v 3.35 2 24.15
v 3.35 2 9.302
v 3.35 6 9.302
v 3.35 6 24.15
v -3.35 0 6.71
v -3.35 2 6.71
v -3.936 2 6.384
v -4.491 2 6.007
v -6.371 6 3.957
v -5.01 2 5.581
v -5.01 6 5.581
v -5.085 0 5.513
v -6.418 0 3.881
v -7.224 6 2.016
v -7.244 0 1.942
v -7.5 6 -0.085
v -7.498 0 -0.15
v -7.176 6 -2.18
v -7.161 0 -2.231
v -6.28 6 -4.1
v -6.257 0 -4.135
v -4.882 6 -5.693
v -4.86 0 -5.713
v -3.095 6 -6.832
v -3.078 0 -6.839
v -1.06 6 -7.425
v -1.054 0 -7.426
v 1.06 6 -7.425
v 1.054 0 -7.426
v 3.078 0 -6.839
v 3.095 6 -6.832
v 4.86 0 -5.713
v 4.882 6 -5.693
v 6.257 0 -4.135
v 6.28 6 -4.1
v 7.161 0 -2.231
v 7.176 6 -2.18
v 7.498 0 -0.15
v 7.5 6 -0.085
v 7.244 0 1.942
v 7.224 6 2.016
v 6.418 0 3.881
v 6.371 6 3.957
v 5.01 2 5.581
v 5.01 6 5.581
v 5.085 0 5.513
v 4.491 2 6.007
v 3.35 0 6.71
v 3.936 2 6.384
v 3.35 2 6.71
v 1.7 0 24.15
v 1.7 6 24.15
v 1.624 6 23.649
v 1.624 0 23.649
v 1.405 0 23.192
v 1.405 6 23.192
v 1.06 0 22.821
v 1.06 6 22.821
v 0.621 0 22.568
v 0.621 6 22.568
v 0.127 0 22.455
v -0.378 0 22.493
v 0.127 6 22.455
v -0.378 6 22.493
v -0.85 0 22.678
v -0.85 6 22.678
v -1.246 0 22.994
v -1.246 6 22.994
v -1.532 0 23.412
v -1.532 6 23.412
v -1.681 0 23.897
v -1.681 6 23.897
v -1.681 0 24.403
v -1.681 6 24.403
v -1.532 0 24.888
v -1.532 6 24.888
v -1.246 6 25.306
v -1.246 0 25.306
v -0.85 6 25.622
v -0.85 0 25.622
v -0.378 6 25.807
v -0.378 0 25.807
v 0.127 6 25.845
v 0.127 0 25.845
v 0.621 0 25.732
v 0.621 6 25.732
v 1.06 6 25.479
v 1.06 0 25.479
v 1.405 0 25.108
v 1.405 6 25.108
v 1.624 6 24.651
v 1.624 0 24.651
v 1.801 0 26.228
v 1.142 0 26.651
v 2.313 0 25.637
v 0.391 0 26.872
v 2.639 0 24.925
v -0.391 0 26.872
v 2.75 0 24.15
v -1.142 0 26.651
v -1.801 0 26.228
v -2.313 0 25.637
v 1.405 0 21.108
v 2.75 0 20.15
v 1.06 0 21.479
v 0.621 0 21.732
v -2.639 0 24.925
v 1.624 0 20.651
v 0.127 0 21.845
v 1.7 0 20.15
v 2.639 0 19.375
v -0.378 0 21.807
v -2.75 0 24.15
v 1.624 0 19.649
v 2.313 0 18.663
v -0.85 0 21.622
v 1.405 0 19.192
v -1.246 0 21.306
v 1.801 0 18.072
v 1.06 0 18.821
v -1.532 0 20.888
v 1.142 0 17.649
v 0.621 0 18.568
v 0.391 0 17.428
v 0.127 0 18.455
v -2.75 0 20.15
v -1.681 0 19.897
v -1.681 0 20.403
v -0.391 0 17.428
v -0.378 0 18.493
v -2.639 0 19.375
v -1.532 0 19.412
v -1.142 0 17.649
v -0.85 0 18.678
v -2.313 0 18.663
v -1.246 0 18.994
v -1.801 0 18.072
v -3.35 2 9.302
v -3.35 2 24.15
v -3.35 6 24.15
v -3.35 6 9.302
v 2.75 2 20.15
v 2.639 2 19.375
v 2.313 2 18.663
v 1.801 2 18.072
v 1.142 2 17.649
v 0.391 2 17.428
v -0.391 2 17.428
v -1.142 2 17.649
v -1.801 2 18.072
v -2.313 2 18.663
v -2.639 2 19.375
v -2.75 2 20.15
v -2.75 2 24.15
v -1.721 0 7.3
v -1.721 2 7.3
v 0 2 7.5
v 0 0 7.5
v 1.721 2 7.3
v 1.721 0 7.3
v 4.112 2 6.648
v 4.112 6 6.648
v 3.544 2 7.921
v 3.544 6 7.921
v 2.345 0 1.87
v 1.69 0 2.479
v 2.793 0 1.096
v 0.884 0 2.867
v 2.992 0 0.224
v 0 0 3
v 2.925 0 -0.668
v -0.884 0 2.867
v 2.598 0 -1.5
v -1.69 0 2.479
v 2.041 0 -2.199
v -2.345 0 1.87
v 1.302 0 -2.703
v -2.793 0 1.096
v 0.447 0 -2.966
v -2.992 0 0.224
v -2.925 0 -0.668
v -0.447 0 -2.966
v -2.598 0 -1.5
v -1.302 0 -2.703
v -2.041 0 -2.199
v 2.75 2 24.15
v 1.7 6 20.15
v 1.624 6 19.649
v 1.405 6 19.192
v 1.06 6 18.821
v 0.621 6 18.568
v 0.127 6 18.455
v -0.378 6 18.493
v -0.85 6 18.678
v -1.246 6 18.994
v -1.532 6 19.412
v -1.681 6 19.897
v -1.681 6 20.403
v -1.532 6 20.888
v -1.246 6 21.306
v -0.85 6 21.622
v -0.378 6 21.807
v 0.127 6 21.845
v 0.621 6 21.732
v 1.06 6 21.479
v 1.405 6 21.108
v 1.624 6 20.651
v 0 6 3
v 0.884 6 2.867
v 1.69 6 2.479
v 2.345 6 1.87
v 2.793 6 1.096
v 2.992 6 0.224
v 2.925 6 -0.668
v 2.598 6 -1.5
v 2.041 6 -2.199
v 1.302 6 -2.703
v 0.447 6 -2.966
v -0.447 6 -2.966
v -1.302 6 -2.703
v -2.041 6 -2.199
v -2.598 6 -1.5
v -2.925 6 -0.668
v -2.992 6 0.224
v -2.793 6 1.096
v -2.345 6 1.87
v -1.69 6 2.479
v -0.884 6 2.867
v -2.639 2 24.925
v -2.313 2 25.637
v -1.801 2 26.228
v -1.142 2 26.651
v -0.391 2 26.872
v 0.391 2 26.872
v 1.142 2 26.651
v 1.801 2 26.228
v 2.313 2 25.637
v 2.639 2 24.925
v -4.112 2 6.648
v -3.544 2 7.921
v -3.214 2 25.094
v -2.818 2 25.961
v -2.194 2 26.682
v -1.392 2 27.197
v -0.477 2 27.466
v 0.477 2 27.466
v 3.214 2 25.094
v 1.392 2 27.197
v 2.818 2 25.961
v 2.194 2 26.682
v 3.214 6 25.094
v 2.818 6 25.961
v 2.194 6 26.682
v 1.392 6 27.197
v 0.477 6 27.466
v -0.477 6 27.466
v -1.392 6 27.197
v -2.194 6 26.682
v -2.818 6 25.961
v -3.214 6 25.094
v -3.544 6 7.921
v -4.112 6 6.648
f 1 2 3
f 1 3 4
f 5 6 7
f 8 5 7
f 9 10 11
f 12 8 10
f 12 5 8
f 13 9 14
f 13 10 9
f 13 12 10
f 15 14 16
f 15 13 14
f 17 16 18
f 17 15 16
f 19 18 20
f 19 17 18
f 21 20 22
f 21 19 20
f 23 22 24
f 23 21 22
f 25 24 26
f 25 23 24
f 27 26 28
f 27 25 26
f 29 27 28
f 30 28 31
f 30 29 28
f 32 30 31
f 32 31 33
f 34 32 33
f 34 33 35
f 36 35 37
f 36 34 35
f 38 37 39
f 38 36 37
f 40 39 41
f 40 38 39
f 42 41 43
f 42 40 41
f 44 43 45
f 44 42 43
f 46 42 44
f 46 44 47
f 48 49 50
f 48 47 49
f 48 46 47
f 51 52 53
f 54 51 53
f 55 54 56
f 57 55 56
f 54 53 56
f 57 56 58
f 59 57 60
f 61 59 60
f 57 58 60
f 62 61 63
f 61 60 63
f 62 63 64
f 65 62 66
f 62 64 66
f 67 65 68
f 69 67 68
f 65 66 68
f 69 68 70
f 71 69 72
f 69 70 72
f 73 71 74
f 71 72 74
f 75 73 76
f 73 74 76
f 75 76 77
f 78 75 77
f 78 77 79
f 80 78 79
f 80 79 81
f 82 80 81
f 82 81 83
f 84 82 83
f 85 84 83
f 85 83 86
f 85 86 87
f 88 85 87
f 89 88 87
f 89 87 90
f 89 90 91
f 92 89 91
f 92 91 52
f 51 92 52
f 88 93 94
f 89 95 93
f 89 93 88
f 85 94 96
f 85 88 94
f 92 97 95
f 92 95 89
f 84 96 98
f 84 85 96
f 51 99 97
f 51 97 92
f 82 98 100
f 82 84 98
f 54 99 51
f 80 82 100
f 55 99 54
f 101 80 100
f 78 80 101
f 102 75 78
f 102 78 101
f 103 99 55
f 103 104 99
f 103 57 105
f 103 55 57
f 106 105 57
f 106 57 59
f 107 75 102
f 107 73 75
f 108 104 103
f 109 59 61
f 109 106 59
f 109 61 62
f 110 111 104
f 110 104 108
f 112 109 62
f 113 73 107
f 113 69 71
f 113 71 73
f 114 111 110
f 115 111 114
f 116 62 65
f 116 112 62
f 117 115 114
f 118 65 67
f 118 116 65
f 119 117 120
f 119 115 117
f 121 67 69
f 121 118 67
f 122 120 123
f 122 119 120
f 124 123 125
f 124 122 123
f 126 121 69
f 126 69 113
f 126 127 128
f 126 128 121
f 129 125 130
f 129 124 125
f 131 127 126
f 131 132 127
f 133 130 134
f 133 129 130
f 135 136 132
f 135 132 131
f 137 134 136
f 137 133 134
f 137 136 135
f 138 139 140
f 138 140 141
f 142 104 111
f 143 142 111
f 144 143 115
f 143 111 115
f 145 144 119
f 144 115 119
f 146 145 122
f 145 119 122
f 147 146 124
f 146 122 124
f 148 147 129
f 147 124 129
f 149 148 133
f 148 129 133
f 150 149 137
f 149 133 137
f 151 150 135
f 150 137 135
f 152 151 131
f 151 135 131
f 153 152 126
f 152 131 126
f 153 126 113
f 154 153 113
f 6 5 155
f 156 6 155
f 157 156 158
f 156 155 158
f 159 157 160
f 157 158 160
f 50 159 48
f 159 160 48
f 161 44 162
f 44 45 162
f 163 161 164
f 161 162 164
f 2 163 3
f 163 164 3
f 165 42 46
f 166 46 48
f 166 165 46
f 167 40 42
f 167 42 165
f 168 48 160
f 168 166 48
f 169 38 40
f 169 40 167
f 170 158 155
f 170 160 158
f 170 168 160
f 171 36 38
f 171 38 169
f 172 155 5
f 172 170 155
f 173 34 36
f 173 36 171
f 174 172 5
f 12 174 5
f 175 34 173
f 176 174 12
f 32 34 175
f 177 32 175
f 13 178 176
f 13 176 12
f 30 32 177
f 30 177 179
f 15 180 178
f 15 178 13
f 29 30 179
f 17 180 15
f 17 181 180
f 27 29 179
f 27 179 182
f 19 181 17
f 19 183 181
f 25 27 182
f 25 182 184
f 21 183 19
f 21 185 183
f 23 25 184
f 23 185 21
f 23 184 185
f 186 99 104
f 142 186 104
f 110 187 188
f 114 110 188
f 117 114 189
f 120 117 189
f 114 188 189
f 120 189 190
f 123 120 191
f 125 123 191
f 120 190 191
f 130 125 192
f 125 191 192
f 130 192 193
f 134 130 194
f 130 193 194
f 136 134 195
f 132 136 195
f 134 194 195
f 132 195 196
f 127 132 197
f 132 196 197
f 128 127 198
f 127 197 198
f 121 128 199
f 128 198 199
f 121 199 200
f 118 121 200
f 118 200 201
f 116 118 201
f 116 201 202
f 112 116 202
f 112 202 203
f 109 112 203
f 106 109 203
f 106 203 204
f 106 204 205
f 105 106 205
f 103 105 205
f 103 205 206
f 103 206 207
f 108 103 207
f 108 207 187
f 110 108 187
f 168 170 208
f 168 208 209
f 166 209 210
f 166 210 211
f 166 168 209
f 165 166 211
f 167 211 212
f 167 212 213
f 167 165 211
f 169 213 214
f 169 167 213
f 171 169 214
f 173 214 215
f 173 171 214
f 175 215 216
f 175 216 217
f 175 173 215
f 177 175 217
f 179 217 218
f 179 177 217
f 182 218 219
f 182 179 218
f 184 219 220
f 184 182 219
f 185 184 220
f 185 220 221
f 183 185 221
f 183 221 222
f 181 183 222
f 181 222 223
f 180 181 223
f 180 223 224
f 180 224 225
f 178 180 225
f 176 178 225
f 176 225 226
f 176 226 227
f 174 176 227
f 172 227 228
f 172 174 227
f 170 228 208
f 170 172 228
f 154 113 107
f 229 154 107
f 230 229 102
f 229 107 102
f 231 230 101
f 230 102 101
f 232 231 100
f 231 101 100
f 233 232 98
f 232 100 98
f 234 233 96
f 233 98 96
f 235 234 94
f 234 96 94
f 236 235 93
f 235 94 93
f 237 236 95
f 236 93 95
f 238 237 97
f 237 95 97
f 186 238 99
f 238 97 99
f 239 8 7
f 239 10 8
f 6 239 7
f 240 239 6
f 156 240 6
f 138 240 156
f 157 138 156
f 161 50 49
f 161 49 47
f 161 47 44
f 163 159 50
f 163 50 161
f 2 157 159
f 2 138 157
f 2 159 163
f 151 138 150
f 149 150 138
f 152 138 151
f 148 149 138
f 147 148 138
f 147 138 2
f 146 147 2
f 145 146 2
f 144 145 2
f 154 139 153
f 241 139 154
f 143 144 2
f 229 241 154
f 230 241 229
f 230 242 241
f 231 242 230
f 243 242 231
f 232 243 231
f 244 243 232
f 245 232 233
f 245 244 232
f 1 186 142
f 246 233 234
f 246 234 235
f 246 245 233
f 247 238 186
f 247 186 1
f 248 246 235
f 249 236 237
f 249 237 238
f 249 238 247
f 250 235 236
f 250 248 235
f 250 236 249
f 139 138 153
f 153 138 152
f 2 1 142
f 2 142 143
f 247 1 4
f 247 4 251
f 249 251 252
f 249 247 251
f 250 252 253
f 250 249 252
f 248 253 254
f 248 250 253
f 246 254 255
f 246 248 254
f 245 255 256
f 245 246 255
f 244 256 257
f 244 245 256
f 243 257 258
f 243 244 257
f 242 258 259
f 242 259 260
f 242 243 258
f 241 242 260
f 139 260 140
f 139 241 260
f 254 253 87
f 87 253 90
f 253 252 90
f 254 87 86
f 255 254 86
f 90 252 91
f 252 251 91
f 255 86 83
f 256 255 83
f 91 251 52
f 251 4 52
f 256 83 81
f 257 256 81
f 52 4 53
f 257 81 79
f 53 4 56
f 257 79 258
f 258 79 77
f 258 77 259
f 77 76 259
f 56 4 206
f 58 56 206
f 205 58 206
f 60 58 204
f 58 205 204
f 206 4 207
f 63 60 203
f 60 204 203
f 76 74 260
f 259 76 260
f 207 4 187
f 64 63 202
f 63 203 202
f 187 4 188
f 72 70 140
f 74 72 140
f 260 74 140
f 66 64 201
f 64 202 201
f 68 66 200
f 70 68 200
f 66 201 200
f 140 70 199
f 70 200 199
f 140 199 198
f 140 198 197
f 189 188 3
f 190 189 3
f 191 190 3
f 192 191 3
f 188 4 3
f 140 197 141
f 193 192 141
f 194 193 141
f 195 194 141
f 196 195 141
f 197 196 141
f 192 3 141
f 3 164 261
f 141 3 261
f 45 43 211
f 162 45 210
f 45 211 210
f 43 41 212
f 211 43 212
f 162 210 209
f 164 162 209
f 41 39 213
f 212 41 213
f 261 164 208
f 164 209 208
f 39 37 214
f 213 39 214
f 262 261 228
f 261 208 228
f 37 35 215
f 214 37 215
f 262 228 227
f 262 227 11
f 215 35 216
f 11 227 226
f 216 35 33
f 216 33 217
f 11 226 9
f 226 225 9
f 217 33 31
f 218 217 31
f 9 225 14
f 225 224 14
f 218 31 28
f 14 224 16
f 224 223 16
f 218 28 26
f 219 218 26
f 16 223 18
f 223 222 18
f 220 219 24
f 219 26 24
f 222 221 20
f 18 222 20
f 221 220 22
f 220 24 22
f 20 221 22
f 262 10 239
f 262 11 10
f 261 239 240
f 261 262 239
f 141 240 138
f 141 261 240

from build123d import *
from build123d.topology import SkipClean

# Parameters (mm, degrees)
ESQUISSE1_R             = 3
BOSS_EXTRU_1_DEPTH      = 6
D_GAGEMENT_M31_D        = 3.4
ENL_V_MAT_EXTRU_1_DEPTH = 2
CONG_2_R                = 5


with BuildPart() as part:
    # Esquisse1 → Boss.-Extru.1 (new body)
    with BuildSketch(Plane(origin=(0, 0, 0), x_dir=(1, 0, 0), z_dir=(0, 1, 0))):
        with BuildLine():
            Line((-3.35, -24.15), (-3.35, -6.710253348))
            ThreePointArc((-3.35, -6.710253348), (0, 7.5), (3.35, -6.710253348))
            Line((3.35, -6.710253348), (3.35, -24.15))
            ThreePointArc((3.35, -24.15), (0, -27.5), (-3.35, -24.15))
        make_face()
        with Locations(Location((0, 0, 0), (0, 0, 270))):
            Circle(ESQUISSE1_R, mode=Mode.SUBTRACT)
    extrude(amount=BOSS_EXTRU_1_DEPTH)

    # Dégagement M31 (through all)
    with Locations(Plane(origin=(0, 0, 0), x_dir=(-1, 0, 0), z_dir=(0, -1, 0))):
        with Locations((0, -24.15), (0, -20.15)):
            Hole(D_GAGEMENT_M31_D / 2)

    # Esquisse6 → Enlèv. mat.-Extru.1 (cut)
    with SkipClean():  # the faces are left unmerged after this step: merging them gives an invalid solid
        with BuildSketch(Plane.XZ):
            with BuildLine():
                Line((-3.35, 24.15), (-3.35, 6.710253348))
                ThreePointArc((-3.35, 6.710253348), (0, 7.5), (3.35, 6.710253348))
                Line((3.35, 6.710253348), (3.35, 24.15))
                ThreePointArc((3.35, 24.15), (0, 27.5), (-3.35, 24.15))
            make_face()
            with BuildLine():
                Line((2.75, 24.15), (2.75, 20.15))
                ThreePointArc((2.75, 20.15), (0, 17.4), (-2.75, 20.15))
                Line((-2.75, 20.15), (-2.75, 24.15))
                ThreePointArc((-2.75, 24.15), (0, 26.9), (2.75, 24.15))
            make_face(mode=Mode.SUBTRACT)
        extrude(amount=-ENL_V_MAT_EXTRU_1_DEPTH, mode=Mode.SUBTRACT)

    # Congé2
    cong_2_edges = [part.edges().sort_by_distance(p)[0] for p in [
        (-3.35, 4, 6.710253348),
        (3.35, 4, 6.710253348),
    ]]
    fillet(cong_2_edges, radius=CONG_2_R)


solid = part.part
